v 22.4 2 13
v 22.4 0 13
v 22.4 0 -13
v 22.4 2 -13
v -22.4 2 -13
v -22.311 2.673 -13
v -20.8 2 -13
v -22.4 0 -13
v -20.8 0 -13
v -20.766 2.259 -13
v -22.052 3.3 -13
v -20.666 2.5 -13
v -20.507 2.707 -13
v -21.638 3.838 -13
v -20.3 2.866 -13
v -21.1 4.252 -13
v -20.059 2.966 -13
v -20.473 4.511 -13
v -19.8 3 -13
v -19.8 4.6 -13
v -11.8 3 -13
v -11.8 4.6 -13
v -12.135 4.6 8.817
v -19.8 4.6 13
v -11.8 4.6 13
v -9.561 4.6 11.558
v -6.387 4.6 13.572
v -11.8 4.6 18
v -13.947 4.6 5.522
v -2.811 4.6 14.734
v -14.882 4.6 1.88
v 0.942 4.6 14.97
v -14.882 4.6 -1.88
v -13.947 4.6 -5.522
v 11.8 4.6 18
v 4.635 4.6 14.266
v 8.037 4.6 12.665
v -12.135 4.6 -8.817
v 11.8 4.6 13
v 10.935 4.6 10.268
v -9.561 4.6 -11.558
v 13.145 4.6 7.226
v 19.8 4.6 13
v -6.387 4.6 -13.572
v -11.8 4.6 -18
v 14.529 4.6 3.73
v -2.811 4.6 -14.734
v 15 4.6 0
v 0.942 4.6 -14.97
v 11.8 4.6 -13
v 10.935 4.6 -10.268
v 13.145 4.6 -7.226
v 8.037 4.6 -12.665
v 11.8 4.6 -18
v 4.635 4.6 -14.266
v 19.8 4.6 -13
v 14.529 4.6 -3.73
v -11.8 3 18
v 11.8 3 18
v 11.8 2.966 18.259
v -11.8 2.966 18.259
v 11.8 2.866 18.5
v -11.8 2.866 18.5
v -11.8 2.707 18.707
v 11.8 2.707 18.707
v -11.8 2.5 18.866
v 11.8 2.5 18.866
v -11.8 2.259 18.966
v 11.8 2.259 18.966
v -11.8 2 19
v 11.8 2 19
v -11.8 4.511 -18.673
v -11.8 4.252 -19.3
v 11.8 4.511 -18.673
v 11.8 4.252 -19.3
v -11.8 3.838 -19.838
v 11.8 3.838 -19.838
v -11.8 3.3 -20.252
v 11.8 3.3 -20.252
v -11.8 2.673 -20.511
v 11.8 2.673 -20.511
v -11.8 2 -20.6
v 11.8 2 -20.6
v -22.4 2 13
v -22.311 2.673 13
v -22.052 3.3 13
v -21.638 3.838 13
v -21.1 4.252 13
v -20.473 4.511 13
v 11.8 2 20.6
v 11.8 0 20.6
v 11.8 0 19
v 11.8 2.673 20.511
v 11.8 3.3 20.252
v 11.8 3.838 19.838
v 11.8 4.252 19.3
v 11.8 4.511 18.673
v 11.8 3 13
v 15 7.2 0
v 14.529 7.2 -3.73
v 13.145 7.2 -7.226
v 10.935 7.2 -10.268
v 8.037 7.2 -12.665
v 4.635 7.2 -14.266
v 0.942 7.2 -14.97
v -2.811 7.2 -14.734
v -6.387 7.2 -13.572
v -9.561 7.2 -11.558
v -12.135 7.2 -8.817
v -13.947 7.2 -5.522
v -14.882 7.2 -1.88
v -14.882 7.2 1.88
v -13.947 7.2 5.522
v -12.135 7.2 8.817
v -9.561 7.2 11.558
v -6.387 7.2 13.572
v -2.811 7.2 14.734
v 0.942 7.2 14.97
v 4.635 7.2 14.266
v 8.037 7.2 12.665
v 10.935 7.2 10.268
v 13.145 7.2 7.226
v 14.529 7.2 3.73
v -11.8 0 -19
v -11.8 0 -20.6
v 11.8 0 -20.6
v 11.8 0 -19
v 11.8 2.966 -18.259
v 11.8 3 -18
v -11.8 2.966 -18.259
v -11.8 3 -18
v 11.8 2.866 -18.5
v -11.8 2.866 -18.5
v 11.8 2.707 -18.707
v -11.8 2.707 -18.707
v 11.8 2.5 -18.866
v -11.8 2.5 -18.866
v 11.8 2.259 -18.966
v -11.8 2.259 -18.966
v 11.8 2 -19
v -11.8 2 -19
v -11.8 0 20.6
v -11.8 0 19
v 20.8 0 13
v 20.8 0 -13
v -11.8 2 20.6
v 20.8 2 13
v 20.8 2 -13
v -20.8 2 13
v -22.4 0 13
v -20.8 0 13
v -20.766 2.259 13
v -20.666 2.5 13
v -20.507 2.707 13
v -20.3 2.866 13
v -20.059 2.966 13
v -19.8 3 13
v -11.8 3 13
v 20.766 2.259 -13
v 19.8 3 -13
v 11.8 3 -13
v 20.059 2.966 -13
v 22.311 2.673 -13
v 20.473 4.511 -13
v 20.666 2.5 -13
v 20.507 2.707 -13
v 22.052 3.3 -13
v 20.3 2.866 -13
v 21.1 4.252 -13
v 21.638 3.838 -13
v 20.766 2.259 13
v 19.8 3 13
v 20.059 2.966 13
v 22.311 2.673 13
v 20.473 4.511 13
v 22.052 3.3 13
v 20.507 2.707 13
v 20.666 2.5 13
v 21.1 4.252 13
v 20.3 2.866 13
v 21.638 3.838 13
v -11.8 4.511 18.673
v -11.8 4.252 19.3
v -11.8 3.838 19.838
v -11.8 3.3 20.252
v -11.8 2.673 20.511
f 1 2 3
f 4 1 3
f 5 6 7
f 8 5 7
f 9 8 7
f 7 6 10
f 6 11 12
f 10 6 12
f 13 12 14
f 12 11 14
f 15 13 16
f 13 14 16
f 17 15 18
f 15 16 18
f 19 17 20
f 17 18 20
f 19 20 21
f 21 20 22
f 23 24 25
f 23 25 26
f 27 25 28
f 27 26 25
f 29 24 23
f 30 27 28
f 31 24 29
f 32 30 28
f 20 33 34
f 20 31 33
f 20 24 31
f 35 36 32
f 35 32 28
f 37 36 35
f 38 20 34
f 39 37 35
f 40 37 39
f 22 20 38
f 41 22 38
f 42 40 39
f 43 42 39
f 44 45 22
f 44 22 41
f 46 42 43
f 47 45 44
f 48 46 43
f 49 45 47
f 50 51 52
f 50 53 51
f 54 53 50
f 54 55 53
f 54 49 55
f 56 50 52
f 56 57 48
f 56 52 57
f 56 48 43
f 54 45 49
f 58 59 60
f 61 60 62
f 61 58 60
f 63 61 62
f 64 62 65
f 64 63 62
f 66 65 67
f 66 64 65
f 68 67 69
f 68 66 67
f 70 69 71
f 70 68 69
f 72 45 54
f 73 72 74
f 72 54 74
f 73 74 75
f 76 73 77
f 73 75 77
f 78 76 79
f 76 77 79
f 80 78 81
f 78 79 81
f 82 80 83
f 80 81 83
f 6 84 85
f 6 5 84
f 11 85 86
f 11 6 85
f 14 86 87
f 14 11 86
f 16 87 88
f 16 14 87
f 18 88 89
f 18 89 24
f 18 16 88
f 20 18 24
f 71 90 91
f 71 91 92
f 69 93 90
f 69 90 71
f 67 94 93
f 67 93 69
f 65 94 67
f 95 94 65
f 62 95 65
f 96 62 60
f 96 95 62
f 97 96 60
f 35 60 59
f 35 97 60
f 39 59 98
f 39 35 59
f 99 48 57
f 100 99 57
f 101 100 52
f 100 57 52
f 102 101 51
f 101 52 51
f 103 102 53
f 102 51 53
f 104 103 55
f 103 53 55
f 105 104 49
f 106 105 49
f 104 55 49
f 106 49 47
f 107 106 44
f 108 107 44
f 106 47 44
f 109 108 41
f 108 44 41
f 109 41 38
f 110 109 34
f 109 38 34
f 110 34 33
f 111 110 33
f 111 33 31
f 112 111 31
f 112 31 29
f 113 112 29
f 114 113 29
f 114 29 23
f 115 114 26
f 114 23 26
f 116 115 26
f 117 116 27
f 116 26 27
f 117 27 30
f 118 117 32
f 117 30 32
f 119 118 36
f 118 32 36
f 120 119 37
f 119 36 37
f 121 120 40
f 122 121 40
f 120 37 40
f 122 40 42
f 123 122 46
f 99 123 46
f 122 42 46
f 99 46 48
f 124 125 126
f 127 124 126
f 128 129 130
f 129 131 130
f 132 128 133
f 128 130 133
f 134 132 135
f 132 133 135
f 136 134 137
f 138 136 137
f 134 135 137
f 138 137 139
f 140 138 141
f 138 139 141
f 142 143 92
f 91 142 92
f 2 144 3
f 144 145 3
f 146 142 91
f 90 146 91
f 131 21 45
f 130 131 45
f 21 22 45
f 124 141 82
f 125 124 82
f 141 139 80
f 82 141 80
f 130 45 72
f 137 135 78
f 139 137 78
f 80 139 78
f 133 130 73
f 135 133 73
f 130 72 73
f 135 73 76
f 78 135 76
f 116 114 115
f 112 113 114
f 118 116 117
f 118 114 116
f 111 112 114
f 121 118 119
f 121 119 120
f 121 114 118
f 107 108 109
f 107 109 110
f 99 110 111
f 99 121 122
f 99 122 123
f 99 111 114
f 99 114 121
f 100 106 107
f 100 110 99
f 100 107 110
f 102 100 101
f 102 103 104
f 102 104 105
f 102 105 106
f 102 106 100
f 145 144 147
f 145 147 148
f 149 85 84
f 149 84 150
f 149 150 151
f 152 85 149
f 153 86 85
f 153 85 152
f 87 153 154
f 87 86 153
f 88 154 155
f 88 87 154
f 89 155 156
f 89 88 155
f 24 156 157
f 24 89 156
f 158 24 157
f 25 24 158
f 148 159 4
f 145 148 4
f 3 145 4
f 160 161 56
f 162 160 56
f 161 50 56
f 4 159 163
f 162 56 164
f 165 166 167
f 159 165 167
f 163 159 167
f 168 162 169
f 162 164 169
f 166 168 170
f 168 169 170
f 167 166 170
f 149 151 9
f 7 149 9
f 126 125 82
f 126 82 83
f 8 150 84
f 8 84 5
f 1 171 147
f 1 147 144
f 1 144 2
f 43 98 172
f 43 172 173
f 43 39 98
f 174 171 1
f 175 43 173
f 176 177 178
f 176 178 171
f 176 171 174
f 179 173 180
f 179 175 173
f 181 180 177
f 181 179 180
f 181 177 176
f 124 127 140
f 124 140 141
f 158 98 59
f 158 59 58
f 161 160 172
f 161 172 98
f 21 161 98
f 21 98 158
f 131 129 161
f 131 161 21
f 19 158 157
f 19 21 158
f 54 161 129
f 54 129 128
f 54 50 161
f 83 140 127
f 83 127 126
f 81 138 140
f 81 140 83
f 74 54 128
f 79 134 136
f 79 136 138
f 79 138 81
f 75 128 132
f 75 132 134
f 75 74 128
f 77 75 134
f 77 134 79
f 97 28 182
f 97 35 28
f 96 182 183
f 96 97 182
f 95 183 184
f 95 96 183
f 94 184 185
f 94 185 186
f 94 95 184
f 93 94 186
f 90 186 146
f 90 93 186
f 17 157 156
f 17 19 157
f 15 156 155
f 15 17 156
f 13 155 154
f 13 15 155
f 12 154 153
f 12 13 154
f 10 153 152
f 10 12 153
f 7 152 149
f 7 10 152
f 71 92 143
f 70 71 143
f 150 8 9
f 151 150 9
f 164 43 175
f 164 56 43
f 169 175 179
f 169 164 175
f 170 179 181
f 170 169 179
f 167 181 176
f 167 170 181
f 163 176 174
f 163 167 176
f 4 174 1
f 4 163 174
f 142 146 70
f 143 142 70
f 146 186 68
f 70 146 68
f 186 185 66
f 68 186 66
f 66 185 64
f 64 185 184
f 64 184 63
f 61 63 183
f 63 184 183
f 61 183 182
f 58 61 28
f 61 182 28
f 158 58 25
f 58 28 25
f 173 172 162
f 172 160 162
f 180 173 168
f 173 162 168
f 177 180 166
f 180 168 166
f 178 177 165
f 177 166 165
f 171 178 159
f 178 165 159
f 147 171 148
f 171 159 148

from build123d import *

# Parameters (mm, degrees)
SKETCH_1_W          = 44.8
SKETCH_1_H          = 41.2
EXTRUDE_1_DEPTH     = 4.6
SKETCH_3_W          = 41.6
SKETCH_3_H          = 38
CUT_EXTRUDE_1_DEPTH = 3
SKETCH_4_W          = 10.6
SKETCH_4_H          = 7.6
CUT_EXTRUDE_2_DEPTH = 5.6
FILLET_1_R          = 2.6
FILLET_2_R          = 1
SKETCH_5_R          = 15
EXTRUDE_2_DEPTH     = 2.6


with BuildPart() as part:
    # ｽｹｯﾁ1 → ﾎﾞｽ - 押し出し1 (new body)
    with BuildSketch(Plane(origin=(0, 0, 0), x_dir=(1, 0, 0), z_dir=(0, 1, 0))):
        Rectangle(SKETCH_1_W, SKETCH_1_H)
    extrude(amount=EXTRUDE_1_DEPTH)

    # ｽｹｯﾁ3 → ｶｯﾄ - 押し出し1 (cut)
    with BuildSketch(Plane(origin=(0, 0, 0), x_dir=(-1, 0, 0), z_dir=(0, -1, 0))):
        Rectangle(SKETCH_3_W, SKETCH_3_H)
    extrude(amount=-CUT_EXTRUDE_1_DEPTH, mode=Mode.SUBTRACT)

    # ｽｹｯﾁ4 → ｶｯﾄ - 押し出し2 (cut, through all)
    with BuildSketch(Plane(origin=(0, 4.6, 0), x_dir=(1, 0, 0), z_dir=(0, 1, 0))):
        with Locations((17.1, -16.8)):
            Rectangle(SKETCH_4_W, SKETCH_4_H)
        with Locations((17.1, 16.8)):
            Rectangle(SKETCH_4_W, SKETCH_4_H)
        with Locations((-17.1, -16.8)):
            Rectangle(SKETCH_4_W, SKETCH_4_H)
        with Locations((-17.1, 16.8)):
            Rectangle(SKETCH_4_W, SKETCH_4_H)
    extrude(amount=-CUT_EXTRUDE_2_DEPTH, mode=Mode.SUBTRACT)

    # ﾌｨﾚｯﾄ1
    fillet_1_edges = [part.edges().sort_by_distance(p)[0] for p in [
        (22.4, 4.6, 0),
        (0, 4.6, -20.6),
        (0, 4.6, 20.6),
        (-22.4, 4.6, 0),
    ]]
    fillet(fillet_1_edges, radius=FILLET_1_R)

    # ﾌｨﾚｯﾄ2
    fillet_2_edges = [part.edges().sort_by_distance(p)[0] for p in [
        (0, 3, 19),
        (20.8, 3, 0),
        (-20.8, 3, 0),
        (0, 3, -19),
    ]]
    fillet(fillet_2_edges, radius=FILLET_2_R)

    # ｽｹｯﾁ5 → ﾎﾞｽ - 押し出し2 (add)
    with BuildSketch(Plane(origin=(0, 4.6, 0), x_dir=(1, 0, 0), z_dir=(0, 1, 0))):
        Circle(SKETCH_5_R)
    extrude(amount=EXTRUDE_2_DEPTH)


solid = part.part
